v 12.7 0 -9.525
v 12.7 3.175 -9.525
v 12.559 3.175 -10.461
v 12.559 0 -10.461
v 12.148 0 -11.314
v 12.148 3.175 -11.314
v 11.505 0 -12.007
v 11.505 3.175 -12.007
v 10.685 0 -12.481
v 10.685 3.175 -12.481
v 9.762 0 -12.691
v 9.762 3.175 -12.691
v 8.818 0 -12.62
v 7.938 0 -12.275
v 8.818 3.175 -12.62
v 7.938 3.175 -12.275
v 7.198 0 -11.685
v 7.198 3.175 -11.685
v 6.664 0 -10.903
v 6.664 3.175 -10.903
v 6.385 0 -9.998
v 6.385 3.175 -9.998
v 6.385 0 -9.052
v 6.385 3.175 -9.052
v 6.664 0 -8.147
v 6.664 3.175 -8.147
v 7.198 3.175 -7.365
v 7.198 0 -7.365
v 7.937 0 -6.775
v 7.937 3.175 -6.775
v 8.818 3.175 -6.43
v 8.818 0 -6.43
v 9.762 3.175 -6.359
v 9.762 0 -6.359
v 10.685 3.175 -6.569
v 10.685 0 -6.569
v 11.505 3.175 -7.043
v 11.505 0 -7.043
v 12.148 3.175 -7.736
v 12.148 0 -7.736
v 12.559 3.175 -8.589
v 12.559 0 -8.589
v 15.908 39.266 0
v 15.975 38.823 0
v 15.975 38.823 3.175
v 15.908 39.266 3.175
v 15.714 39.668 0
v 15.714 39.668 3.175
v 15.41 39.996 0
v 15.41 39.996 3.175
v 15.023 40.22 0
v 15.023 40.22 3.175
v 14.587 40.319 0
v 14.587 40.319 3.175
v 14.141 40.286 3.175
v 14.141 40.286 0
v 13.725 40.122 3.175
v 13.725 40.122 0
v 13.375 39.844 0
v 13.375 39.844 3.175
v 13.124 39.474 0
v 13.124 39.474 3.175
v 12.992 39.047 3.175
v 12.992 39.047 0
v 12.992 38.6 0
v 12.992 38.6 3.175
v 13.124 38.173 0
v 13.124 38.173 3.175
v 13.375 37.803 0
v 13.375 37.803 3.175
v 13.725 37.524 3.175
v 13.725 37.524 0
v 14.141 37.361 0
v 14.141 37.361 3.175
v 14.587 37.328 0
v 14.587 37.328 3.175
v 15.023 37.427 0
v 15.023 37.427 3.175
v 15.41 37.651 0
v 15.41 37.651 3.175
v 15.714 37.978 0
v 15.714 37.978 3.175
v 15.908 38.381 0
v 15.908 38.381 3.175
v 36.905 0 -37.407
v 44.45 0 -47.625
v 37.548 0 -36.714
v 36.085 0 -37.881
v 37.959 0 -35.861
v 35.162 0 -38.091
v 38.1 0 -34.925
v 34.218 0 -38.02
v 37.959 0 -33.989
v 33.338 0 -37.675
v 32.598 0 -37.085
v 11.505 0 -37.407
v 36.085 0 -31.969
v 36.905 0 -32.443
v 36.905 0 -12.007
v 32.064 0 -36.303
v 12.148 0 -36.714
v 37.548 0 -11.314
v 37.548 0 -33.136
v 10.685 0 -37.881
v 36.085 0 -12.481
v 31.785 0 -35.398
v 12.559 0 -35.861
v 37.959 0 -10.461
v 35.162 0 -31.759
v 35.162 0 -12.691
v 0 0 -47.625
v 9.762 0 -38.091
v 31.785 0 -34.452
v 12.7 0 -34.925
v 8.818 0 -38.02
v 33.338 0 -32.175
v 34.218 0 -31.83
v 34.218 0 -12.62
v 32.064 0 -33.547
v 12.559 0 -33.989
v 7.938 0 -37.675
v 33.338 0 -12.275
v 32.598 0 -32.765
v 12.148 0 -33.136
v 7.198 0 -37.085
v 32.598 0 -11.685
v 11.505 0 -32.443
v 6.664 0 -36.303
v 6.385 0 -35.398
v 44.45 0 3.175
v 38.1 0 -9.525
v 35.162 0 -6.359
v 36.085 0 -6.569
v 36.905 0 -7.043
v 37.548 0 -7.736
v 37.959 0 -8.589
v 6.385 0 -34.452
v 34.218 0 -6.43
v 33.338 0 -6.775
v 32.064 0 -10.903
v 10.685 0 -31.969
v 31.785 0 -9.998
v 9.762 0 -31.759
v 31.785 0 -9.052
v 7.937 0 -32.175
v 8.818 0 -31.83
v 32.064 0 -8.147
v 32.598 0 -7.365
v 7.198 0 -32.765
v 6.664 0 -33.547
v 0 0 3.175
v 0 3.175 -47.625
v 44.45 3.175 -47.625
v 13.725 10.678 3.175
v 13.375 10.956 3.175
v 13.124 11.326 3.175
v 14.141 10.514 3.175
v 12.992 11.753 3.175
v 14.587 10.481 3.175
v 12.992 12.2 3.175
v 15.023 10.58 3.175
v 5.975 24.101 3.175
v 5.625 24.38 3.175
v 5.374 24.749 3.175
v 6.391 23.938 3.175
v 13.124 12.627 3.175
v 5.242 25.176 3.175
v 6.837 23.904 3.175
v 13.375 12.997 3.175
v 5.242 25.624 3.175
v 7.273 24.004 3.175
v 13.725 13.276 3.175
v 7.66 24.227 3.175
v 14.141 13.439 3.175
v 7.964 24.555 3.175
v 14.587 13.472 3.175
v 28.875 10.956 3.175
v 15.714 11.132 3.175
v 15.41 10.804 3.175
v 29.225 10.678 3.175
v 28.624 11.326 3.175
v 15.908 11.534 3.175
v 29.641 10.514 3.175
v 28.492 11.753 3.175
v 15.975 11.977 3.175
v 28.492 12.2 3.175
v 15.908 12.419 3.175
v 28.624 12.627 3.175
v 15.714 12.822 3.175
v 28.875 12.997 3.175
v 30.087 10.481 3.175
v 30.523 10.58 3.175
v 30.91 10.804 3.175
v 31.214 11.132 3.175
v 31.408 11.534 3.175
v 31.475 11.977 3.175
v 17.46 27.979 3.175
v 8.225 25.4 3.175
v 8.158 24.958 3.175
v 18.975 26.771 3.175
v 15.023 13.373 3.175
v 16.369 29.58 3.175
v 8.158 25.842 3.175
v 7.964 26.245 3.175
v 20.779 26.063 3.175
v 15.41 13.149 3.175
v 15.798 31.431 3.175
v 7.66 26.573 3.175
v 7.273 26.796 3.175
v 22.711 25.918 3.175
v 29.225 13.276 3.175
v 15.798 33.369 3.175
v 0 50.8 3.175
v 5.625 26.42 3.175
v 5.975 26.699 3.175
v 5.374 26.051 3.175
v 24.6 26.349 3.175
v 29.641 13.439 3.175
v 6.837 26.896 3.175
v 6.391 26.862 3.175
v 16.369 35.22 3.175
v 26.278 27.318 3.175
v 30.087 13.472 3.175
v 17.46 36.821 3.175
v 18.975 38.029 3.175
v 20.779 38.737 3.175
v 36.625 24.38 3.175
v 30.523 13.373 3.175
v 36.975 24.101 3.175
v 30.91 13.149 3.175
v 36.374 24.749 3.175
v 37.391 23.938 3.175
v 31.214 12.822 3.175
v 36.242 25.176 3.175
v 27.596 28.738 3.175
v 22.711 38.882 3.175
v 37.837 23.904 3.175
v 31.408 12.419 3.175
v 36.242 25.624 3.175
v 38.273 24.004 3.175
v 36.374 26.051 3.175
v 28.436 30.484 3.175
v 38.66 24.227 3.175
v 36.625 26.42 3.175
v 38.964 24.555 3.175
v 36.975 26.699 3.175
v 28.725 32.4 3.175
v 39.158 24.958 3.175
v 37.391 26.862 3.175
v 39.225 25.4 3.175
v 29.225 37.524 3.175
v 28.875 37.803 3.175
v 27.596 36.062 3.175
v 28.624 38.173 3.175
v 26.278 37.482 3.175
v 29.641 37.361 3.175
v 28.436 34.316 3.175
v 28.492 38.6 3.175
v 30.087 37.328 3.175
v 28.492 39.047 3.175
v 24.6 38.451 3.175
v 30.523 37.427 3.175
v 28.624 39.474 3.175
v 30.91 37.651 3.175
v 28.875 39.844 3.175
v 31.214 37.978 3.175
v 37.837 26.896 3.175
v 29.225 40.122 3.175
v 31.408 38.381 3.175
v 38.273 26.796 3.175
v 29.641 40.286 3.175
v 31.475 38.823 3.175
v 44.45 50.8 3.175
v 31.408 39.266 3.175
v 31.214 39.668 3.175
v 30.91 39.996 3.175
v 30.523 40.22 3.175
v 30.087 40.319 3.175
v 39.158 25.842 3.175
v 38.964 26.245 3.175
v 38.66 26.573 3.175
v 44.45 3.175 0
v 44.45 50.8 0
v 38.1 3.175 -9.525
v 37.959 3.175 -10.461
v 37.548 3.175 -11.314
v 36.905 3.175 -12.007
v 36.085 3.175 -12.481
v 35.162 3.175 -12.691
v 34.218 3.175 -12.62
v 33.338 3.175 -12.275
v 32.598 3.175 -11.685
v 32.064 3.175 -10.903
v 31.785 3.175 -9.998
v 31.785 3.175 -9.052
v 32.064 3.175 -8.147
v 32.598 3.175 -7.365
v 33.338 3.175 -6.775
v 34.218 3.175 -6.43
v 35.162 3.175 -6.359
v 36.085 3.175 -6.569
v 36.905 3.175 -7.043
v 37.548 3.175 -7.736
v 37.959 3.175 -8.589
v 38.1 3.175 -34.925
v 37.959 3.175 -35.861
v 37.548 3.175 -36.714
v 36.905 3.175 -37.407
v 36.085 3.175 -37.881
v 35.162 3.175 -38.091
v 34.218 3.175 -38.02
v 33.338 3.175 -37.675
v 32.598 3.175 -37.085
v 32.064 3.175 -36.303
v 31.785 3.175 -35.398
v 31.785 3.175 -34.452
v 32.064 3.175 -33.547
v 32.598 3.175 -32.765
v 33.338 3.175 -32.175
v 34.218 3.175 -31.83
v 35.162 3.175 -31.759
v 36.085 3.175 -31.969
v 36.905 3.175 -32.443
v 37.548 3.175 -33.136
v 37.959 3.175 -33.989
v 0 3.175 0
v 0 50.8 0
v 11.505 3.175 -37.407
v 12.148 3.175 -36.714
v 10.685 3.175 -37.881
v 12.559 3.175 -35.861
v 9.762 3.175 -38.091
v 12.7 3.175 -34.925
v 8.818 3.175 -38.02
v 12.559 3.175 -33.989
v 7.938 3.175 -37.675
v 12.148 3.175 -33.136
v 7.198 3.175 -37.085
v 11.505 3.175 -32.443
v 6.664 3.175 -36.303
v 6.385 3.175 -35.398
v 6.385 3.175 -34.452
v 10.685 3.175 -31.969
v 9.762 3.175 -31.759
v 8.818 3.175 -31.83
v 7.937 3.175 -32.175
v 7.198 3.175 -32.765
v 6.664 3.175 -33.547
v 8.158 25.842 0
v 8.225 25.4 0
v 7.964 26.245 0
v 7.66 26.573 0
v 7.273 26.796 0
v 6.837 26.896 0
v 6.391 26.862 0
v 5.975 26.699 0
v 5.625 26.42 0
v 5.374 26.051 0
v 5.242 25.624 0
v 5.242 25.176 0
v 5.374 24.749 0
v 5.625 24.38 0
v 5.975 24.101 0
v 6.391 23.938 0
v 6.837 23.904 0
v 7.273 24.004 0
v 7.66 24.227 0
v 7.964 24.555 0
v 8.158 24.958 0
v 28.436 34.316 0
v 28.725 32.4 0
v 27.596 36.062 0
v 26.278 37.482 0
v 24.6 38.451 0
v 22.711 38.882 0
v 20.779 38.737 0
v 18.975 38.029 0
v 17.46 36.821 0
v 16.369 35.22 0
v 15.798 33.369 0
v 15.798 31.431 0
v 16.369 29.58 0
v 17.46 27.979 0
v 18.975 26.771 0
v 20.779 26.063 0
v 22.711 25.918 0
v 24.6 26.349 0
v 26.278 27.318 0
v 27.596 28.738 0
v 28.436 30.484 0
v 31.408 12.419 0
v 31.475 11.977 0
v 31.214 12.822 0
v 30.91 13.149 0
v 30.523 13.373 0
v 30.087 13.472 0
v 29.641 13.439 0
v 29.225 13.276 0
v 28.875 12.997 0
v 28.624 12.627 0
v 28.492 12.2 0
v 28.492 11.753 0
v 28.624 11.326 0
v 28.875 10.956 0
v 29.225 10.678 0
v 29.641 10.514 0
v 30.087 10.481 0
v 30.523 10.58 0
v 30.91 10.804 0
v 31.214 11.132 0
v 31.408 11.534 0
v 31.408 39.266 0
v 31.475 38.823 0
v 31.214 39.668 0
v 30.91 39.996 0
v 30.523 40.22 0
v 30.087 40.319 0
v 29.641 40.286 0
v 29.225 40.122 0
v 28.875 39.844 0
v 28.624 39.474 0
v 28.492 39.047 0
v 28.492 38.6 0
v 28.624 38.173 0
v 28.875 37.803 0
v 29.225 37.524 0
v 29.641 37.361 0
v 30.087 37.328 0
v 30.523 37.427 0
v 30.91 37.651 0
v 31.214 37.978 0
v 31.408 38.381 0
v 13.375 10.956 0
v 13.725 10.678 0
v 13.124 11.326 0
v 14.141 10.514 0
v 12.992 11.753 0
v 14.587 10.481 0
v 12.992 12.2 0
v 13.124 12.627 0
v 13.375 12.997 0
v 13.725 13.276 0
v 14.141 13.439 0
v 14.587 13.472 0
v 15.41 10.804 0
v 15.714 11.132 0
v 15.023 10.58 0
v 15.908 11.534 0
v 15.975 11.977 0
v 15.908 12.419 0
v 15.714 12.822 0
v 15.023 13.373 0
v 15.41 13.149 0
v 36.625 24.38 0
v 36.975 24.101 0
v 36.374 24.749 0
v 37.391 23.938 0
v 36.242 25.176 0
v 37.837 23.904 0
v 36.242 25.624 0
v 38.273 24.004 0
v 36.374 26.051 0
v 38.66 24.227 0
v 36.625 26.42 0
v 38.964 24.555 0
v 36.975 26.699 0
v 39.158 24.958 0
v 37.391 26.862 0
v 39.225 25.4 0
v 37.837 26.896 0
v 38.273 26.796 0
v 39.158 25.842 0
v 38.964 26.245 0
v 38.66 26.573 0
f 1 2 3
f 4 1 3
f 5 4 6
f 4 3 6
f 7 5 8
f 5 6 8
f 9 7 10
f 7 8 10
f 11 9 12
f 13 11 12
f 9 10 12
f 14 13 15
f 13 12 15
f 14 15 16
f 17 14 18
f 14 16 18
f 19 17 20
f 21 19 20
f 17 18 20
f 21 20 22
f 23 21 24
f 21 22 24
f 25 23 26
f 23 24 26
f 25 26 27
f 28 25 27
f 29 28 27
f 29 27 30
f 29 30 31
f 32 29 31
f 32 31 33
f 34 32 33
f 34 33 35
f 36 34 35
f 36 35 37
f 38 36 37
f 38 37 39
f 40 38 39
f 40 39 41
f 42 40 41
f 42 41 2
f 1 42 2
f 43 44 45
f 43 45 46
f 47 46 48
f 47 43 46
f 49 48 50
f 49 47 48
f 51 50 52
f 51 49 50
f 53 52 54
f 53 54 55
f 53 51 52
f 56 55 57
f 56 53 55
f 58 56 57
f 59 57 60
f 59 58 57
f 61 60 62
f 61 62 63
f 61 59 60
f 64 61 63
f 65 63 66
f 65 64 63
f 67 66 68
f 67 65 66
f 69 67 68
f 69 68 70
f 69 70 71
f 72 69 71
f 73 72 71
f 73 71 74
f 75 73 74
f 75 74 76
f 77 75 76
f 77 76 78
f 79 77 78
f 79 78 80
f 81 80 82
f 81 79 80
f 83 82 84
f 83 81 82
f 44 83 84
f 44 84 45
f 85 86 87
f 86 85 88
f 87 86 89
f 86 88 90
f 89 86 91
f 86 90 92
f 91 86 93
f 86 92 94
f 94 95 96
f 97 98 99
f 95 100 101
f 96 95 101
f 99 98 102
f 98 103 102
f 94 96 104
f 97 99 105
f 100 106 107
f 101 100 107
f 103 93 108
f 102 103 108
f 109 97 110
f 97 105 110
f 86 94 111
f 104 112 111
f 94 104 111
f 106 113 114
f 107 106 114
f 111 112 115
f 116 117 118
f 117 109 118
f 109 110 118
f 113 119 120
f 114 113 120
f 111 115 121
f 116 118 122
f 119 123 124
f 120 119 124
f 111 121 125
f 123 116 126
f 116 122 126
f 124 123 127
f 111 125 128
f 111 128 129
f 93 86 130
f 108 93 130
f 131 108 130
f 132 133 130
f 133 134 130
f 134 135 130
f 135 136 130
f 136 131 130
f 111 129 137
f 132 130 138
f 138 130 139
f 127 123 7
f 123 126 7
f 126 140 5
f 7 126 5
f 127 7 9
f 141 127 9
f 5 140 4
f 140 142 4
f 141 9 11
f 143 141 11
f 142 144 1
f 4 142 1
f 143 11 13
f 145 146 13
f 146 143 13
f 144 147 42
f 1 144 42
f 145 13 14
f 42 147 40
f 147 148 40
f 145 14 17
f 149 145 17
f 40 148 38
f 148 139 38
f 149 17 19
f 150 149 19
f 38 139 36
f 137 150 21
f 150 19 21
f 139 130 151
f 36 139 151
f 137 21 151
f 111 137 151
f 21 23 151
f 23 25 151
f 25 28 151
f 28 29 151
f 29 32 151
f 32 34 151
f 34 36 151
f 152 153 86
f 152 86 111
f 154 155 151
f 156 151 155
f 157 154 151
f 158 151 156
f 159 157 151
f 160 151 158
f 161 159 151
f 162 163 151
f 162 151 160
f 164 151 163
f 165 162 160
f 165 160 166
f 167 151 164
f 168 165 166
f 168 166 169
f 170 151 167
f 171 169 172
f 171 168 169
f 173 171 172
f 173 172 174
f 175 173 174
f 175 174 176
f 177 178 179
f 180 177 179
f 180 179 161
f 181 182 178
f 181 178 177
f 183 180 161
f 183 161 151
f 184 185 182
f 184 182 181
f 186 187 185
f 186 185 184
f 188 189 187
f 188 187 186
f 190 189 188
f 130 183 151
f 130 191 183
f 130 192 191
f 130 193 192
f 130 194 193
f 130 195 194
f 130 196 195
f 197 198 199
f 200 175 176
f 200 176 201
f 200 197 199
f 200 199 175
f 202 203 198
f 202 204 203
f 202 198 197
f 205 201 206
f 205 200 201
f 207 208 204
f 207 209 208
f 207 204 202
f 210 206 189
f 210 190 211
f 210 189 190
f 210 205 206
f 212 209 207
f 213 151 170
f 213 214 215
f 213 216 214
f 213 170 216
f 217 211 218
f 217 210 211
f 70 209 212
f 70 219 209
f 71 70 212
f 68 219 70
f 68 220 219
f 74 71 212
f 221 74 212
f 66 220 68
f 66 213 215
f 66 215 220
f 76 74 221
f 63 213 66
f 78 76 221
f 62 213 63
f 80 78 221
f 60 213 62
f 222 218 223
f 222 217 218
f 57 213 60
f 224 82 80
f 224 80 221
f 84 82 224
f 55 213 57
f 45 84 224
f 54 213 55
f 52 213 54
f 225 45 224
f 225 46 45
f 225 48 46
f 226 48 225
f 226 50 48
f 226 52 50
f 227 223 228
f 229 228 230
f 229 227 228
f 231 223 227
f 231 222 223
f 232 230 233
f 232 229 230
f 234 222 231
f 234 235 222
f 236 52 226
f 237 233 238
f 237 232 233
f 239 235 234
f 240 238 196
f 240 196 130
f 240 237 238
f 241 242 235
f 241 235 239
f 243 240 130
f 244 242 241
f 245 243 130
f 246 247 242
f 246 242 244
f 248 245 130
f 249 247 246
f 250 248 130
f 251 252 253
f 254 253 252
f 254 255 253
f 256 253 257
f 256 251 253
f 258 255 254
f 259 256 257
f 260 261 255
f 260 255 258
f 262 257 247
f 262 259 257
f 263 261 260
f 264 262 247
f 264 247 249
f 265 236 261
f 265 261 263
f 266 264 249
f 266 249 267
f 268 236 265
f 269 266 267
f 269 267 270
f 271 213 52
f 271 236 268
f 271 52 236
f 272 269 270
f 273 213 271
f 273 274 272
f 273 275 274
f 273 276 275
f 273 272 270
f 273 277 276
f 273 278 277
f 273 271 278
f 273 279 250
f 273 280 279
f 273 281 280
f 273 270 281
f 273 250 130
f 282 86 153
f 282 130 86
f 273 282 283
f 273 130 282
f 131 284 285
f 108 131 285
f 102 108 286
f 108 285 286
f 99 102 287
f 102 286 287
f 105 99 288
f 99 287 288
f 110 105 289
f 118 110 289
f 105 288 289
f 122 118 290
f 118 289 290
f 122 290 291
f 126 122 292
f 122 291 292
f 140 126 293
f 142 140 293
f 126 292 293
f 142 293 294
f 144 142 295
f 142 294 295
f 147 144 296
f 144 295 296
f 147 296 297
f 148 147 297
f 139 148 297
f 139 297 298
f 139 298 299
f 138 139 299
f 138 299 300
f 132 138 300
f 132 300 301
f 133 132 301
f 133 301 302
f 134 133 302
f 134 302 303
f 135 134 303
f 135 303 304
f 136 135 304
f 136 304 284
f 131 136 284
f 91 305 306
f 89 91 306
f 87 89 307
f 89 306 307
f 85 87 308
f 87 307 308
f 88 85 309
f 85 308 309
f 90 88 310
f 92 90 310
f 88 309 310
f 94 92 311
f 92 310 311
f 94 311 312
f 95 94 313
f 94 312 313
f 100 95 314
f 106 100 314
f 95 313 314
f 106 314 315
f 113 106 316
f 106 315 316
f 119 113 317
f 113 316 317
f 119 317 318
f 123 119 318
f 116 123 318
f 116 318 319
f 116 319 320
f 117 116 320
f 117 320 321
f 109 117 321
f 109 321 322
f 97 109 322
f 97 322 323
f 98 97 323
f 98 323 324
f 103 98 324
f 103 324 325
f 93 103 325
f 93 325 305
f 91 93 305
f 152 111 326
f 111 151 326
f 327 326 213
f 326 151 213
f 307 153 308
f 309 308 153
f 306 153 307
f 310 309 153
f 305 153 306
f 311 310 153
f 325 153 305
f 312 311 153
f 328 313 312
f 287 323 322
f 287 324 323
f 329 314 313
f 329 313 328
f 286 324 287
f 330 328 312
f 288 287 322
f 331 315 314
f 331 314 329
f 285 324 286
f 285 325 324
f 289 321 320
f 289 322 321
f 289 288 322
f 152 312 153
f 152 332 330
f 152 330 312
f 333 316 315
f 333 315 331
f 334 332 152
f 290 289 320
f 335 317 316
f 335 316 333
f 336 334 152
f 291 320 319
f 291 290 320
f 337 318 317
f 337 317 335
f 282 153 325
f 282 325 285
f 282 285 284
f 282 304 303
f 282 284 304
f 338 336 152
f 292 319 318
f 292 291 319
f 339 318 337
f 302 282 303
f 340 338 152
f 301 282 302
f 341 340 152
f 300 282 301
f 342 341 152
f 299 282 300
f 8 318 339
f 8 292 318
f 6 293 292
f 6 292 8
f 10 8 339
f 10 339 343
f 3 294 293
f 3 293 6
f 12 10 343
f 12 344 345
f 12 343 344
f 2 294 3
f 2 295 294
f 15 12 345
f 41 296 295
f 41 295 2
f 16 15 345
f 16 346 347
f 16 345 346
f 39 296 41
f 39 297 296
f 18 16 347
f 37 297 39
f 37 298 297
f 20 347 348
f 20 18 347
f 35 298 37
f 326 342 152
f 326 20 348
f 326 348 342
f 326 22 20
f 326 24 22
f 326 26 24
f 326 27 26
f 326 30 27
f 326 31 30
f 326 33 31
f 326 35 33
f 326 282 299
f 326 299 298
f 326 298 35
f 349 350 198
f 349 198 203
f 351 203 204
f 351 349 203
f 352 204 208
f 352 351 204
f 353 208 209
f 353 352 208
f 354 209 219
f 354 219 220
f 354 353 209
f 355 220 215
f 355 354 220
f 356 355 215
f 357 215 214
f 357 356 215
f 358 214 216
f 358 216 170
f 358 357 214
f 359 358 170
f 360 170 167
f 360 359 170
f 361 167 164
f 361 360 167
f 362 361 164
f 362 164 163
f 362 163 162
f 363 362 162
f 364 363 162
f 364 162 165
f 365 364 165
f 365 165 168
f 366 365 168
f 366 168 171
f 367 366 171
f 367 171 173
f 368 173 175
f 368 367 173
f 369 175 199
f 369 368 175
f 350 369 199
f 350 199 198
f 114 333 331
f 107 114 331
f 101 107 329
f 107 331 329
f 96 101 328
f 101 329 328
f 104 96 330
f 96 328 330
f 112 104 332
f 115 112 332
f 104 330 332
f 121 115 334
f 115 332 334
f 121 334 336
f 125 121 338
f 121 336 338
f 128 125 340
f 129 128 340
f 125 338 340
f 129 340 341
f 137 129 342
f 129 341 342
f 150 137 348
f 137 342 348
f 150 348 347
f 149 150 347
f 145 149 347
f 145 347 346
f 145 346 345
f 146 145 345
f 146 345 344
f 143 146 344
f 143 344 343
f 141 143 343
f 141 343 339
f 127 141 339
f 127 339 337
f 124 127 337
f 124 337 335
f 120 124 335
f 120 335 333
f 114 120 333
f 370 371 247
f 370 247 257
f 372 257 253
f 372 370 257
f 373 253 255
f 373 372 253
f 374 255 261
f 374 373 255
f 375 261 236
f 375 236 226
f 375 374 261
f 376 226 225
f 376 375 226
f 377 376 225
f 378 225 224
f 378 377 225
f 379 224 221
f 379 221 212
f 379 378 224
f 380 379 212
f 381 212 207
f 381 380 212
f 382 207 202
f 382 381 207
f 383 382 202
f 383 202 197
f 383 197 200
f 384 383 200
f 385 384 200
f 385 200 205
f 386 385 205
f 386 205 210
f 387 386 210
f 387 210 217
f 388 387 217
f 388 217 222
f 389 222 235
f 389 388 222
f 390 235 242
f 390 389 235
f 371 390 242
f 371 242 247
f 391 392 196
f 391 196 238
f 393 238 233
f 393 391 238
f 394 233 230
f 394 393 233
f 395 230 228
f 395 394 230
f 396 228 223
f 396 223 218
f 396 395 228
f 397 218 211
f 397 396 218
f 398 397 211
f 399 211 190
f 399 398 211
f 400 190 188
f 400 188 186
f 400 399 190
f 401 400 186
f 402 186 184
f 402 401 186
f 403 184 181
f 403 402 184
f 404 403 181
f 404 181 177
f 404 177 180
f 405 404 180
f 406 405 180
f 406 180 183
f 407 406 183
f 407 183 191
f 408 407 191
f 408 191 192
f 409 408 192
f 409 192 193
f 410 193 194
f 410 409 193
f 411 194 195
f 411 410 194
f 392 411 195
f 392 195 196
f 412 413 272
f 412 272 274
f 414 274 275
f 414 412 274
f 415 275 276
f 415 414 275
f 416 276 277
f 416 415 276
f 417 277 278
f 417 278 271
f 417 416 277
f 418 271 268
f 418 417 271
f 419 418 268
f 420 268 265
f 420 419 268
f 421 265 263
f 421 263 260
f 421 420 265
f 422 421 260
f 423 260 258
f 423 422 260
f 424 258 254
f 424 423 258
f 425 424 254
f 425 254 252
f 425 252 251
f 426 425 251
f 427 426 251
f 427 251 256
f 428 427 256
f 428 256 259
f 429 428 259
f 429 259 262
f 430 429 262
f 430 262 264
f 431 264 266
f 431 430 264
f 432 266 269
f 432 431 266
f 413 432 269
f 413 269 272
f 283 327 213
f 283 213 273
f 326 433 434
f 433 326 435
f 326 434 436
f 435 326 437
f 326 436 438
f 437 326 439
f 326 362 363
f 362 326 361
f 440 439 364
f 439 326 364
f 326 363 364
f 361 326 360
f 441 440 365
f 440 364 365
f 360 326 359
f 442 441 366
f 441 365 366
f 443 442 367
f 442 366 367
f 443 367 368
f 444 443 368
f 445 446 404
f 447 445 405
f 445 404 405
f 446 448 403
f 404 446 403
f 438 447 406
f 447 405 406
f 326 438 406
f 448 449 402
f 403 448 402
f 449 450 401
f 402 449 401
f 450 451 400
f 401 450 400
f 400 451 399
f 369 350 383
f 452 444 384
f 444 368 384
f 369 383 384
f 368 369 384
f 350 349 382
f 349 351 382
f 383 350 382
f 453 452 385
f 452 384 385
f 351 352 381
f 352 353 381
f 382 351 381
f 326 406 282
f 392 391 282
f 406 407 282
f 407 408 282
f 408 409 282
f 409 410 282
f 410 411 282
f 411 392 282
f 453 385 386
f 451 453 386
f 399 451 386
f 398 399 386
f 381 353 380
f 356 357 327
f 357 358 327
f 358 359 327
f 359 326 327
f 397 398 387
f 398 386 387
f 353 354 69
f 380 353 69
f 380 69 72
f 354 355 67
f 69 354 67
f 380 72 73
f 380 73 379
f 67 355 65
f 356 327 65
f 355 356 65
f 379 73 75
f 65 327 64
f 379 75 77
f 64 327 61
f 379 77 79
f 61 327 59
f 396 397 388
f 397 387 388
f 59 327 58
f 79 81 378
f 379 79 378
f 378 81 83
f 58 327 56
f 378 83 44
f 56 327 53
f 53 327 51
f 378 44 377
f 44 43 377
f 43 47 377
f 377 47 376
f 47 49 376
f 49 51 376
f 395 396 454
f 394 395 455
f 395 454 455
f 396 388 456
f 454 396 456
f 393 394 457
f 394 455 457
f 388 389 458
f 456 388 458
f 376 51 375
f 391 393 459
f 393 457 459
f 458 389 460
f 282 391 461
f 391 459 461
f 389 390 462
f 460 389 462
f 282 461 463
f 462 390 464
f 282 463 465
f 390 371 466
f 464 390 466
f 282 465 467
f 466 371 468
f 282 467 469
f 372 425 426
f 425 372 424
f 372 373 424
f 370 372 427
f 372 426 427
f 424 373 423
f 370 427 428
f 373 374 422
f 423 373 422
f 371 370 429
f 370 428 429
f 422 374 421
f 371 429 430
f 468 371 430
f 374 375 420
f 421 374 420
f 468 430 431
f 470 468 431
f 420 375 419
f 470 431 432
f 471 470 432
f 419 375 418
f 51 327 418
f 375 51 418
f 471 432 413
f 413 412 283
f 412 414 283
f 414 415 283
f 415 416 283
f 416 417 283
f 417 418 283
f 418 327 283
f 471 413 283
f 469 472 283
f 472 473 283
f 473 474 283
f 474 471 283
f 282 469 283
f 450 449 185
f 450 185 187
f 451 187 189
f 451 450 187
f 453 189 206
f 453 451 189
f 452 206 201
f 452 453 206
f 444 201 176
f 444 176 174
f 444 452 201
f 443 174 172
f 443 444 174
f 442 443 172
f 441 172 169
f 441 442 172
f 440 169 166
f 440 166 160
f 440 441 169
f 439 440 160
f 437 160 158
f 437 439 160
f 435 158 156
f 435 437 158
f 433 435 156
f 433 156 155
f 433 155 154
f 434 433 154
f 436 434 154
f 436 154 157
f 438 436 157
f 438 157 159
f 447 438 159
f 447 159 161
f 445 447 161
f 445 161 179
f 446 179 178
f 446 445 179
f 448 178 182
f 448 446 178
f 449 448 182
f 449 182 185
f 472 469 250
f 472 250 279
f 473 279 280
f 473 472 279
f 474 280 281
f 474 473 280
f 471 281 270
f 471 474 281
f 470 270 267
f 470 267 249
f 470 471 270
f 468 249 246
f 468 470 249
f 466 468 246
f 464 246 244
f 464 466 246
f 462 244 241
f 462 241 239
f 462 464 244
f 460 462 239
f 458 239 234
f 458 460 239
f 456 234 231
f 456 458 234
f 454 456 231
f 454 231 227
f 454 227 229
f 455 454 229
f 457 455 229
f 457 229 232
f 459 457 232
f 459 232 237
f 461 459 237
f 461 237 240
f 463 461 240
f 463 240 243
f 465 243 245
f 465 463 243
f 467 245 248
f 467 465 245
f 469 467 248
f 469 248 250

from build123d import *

# Parameters (mm, degrees)
SKETCH1_W           = 44.45
SKETCH1_H           = 50.8
SKETCH1_R           = 6.5
SKETCH1_R_2         = 1.5
BOSS_EXTRUDE1_DEPTH = 3.175
SKETCH2_W           = 44.45
SKETCH2_H           = 3.175
BOSS_EXTRUDE2_DEPTH = 47.625
SKETCH3_R           = 3.175
CUT_EXTRUDE1_DEPTH  = 4.175


with BuildPart() as part:
    # Sketch1 → Boss-Extrude1 (new body)
    with BuildSketch(Plane.XY):
        with Locations((22.225, 25.4)):
            Rectangle(SKETCH1_W, SKETCH1_H)
        with Locations((22.225, 32.4)):
            Circle(SKETCH1_R, mode=Mode.SUBTRACT)
        with Locations((6.725, 25.4)):
            Circle(SKETCH1_R_2, mode=Mode.SUBTRACT)
        with Locations((37.725, 25.4)):
            Circle(SKETCH1_R_2, mode=Mode.SUBTRACT)
        with Locations((29.975, 11.976606241)):
            Circle(SKETCH1_R_2, mode=Mode.SUBTRACT)
        with Locations((14.475, 11.976606241)):
            Circle(SKETCH1_R_2, mode=Mode.SUBTRACT)
        with Locations((14.475, 38.823393759)):
            Circle(SKETCH1_R_2, mode=Mode.SUBTRACT)
        with Locations((29.975, 38.823393759)):
            Circle(SKETCH1_R_2, mode=Mode.SUBTRACT)
    extrude(amount=BOSS_EXTRUDE1_DEPTH)

    # Sketch2 → Boss-Extrude2 (add)
    with BuildSketch(Plane(origin=(0, 0, 0), x_dir=(-1, 0, 0), z_dir=(0, 0, -1))):
        with Locations((-22.225, 1.5875)):
            Rectangle(SKETCH2_W, SKETCH2_H)
    extrude(amount=BOSS_EXTRUDE2_DEPTH)

    # Sketch3 → Cut-Extrude1 (cut, through all)
    with BuildSketch(Plane(origin=(0, 3.175, 0), x_dir=(1, 0, 0), z_dir=(0, 1, 0))):
        with Locations((34.925, 9.525)):
            Circle(SKETCH3_R)
        with Locations((34.925, 34.925)):
            Circle(SKETCH3_R)
        with Locations((9.525, 9.525)):
            Circle(SKETCH3_R)
        with Locations((9.525, 34.925)):
            Circle(SKETCH3_R)
    extrude(amount=-CUT_EXTRUDE1_DEPTH, mode=Mode.SUBTRACT)


solid = part.part
